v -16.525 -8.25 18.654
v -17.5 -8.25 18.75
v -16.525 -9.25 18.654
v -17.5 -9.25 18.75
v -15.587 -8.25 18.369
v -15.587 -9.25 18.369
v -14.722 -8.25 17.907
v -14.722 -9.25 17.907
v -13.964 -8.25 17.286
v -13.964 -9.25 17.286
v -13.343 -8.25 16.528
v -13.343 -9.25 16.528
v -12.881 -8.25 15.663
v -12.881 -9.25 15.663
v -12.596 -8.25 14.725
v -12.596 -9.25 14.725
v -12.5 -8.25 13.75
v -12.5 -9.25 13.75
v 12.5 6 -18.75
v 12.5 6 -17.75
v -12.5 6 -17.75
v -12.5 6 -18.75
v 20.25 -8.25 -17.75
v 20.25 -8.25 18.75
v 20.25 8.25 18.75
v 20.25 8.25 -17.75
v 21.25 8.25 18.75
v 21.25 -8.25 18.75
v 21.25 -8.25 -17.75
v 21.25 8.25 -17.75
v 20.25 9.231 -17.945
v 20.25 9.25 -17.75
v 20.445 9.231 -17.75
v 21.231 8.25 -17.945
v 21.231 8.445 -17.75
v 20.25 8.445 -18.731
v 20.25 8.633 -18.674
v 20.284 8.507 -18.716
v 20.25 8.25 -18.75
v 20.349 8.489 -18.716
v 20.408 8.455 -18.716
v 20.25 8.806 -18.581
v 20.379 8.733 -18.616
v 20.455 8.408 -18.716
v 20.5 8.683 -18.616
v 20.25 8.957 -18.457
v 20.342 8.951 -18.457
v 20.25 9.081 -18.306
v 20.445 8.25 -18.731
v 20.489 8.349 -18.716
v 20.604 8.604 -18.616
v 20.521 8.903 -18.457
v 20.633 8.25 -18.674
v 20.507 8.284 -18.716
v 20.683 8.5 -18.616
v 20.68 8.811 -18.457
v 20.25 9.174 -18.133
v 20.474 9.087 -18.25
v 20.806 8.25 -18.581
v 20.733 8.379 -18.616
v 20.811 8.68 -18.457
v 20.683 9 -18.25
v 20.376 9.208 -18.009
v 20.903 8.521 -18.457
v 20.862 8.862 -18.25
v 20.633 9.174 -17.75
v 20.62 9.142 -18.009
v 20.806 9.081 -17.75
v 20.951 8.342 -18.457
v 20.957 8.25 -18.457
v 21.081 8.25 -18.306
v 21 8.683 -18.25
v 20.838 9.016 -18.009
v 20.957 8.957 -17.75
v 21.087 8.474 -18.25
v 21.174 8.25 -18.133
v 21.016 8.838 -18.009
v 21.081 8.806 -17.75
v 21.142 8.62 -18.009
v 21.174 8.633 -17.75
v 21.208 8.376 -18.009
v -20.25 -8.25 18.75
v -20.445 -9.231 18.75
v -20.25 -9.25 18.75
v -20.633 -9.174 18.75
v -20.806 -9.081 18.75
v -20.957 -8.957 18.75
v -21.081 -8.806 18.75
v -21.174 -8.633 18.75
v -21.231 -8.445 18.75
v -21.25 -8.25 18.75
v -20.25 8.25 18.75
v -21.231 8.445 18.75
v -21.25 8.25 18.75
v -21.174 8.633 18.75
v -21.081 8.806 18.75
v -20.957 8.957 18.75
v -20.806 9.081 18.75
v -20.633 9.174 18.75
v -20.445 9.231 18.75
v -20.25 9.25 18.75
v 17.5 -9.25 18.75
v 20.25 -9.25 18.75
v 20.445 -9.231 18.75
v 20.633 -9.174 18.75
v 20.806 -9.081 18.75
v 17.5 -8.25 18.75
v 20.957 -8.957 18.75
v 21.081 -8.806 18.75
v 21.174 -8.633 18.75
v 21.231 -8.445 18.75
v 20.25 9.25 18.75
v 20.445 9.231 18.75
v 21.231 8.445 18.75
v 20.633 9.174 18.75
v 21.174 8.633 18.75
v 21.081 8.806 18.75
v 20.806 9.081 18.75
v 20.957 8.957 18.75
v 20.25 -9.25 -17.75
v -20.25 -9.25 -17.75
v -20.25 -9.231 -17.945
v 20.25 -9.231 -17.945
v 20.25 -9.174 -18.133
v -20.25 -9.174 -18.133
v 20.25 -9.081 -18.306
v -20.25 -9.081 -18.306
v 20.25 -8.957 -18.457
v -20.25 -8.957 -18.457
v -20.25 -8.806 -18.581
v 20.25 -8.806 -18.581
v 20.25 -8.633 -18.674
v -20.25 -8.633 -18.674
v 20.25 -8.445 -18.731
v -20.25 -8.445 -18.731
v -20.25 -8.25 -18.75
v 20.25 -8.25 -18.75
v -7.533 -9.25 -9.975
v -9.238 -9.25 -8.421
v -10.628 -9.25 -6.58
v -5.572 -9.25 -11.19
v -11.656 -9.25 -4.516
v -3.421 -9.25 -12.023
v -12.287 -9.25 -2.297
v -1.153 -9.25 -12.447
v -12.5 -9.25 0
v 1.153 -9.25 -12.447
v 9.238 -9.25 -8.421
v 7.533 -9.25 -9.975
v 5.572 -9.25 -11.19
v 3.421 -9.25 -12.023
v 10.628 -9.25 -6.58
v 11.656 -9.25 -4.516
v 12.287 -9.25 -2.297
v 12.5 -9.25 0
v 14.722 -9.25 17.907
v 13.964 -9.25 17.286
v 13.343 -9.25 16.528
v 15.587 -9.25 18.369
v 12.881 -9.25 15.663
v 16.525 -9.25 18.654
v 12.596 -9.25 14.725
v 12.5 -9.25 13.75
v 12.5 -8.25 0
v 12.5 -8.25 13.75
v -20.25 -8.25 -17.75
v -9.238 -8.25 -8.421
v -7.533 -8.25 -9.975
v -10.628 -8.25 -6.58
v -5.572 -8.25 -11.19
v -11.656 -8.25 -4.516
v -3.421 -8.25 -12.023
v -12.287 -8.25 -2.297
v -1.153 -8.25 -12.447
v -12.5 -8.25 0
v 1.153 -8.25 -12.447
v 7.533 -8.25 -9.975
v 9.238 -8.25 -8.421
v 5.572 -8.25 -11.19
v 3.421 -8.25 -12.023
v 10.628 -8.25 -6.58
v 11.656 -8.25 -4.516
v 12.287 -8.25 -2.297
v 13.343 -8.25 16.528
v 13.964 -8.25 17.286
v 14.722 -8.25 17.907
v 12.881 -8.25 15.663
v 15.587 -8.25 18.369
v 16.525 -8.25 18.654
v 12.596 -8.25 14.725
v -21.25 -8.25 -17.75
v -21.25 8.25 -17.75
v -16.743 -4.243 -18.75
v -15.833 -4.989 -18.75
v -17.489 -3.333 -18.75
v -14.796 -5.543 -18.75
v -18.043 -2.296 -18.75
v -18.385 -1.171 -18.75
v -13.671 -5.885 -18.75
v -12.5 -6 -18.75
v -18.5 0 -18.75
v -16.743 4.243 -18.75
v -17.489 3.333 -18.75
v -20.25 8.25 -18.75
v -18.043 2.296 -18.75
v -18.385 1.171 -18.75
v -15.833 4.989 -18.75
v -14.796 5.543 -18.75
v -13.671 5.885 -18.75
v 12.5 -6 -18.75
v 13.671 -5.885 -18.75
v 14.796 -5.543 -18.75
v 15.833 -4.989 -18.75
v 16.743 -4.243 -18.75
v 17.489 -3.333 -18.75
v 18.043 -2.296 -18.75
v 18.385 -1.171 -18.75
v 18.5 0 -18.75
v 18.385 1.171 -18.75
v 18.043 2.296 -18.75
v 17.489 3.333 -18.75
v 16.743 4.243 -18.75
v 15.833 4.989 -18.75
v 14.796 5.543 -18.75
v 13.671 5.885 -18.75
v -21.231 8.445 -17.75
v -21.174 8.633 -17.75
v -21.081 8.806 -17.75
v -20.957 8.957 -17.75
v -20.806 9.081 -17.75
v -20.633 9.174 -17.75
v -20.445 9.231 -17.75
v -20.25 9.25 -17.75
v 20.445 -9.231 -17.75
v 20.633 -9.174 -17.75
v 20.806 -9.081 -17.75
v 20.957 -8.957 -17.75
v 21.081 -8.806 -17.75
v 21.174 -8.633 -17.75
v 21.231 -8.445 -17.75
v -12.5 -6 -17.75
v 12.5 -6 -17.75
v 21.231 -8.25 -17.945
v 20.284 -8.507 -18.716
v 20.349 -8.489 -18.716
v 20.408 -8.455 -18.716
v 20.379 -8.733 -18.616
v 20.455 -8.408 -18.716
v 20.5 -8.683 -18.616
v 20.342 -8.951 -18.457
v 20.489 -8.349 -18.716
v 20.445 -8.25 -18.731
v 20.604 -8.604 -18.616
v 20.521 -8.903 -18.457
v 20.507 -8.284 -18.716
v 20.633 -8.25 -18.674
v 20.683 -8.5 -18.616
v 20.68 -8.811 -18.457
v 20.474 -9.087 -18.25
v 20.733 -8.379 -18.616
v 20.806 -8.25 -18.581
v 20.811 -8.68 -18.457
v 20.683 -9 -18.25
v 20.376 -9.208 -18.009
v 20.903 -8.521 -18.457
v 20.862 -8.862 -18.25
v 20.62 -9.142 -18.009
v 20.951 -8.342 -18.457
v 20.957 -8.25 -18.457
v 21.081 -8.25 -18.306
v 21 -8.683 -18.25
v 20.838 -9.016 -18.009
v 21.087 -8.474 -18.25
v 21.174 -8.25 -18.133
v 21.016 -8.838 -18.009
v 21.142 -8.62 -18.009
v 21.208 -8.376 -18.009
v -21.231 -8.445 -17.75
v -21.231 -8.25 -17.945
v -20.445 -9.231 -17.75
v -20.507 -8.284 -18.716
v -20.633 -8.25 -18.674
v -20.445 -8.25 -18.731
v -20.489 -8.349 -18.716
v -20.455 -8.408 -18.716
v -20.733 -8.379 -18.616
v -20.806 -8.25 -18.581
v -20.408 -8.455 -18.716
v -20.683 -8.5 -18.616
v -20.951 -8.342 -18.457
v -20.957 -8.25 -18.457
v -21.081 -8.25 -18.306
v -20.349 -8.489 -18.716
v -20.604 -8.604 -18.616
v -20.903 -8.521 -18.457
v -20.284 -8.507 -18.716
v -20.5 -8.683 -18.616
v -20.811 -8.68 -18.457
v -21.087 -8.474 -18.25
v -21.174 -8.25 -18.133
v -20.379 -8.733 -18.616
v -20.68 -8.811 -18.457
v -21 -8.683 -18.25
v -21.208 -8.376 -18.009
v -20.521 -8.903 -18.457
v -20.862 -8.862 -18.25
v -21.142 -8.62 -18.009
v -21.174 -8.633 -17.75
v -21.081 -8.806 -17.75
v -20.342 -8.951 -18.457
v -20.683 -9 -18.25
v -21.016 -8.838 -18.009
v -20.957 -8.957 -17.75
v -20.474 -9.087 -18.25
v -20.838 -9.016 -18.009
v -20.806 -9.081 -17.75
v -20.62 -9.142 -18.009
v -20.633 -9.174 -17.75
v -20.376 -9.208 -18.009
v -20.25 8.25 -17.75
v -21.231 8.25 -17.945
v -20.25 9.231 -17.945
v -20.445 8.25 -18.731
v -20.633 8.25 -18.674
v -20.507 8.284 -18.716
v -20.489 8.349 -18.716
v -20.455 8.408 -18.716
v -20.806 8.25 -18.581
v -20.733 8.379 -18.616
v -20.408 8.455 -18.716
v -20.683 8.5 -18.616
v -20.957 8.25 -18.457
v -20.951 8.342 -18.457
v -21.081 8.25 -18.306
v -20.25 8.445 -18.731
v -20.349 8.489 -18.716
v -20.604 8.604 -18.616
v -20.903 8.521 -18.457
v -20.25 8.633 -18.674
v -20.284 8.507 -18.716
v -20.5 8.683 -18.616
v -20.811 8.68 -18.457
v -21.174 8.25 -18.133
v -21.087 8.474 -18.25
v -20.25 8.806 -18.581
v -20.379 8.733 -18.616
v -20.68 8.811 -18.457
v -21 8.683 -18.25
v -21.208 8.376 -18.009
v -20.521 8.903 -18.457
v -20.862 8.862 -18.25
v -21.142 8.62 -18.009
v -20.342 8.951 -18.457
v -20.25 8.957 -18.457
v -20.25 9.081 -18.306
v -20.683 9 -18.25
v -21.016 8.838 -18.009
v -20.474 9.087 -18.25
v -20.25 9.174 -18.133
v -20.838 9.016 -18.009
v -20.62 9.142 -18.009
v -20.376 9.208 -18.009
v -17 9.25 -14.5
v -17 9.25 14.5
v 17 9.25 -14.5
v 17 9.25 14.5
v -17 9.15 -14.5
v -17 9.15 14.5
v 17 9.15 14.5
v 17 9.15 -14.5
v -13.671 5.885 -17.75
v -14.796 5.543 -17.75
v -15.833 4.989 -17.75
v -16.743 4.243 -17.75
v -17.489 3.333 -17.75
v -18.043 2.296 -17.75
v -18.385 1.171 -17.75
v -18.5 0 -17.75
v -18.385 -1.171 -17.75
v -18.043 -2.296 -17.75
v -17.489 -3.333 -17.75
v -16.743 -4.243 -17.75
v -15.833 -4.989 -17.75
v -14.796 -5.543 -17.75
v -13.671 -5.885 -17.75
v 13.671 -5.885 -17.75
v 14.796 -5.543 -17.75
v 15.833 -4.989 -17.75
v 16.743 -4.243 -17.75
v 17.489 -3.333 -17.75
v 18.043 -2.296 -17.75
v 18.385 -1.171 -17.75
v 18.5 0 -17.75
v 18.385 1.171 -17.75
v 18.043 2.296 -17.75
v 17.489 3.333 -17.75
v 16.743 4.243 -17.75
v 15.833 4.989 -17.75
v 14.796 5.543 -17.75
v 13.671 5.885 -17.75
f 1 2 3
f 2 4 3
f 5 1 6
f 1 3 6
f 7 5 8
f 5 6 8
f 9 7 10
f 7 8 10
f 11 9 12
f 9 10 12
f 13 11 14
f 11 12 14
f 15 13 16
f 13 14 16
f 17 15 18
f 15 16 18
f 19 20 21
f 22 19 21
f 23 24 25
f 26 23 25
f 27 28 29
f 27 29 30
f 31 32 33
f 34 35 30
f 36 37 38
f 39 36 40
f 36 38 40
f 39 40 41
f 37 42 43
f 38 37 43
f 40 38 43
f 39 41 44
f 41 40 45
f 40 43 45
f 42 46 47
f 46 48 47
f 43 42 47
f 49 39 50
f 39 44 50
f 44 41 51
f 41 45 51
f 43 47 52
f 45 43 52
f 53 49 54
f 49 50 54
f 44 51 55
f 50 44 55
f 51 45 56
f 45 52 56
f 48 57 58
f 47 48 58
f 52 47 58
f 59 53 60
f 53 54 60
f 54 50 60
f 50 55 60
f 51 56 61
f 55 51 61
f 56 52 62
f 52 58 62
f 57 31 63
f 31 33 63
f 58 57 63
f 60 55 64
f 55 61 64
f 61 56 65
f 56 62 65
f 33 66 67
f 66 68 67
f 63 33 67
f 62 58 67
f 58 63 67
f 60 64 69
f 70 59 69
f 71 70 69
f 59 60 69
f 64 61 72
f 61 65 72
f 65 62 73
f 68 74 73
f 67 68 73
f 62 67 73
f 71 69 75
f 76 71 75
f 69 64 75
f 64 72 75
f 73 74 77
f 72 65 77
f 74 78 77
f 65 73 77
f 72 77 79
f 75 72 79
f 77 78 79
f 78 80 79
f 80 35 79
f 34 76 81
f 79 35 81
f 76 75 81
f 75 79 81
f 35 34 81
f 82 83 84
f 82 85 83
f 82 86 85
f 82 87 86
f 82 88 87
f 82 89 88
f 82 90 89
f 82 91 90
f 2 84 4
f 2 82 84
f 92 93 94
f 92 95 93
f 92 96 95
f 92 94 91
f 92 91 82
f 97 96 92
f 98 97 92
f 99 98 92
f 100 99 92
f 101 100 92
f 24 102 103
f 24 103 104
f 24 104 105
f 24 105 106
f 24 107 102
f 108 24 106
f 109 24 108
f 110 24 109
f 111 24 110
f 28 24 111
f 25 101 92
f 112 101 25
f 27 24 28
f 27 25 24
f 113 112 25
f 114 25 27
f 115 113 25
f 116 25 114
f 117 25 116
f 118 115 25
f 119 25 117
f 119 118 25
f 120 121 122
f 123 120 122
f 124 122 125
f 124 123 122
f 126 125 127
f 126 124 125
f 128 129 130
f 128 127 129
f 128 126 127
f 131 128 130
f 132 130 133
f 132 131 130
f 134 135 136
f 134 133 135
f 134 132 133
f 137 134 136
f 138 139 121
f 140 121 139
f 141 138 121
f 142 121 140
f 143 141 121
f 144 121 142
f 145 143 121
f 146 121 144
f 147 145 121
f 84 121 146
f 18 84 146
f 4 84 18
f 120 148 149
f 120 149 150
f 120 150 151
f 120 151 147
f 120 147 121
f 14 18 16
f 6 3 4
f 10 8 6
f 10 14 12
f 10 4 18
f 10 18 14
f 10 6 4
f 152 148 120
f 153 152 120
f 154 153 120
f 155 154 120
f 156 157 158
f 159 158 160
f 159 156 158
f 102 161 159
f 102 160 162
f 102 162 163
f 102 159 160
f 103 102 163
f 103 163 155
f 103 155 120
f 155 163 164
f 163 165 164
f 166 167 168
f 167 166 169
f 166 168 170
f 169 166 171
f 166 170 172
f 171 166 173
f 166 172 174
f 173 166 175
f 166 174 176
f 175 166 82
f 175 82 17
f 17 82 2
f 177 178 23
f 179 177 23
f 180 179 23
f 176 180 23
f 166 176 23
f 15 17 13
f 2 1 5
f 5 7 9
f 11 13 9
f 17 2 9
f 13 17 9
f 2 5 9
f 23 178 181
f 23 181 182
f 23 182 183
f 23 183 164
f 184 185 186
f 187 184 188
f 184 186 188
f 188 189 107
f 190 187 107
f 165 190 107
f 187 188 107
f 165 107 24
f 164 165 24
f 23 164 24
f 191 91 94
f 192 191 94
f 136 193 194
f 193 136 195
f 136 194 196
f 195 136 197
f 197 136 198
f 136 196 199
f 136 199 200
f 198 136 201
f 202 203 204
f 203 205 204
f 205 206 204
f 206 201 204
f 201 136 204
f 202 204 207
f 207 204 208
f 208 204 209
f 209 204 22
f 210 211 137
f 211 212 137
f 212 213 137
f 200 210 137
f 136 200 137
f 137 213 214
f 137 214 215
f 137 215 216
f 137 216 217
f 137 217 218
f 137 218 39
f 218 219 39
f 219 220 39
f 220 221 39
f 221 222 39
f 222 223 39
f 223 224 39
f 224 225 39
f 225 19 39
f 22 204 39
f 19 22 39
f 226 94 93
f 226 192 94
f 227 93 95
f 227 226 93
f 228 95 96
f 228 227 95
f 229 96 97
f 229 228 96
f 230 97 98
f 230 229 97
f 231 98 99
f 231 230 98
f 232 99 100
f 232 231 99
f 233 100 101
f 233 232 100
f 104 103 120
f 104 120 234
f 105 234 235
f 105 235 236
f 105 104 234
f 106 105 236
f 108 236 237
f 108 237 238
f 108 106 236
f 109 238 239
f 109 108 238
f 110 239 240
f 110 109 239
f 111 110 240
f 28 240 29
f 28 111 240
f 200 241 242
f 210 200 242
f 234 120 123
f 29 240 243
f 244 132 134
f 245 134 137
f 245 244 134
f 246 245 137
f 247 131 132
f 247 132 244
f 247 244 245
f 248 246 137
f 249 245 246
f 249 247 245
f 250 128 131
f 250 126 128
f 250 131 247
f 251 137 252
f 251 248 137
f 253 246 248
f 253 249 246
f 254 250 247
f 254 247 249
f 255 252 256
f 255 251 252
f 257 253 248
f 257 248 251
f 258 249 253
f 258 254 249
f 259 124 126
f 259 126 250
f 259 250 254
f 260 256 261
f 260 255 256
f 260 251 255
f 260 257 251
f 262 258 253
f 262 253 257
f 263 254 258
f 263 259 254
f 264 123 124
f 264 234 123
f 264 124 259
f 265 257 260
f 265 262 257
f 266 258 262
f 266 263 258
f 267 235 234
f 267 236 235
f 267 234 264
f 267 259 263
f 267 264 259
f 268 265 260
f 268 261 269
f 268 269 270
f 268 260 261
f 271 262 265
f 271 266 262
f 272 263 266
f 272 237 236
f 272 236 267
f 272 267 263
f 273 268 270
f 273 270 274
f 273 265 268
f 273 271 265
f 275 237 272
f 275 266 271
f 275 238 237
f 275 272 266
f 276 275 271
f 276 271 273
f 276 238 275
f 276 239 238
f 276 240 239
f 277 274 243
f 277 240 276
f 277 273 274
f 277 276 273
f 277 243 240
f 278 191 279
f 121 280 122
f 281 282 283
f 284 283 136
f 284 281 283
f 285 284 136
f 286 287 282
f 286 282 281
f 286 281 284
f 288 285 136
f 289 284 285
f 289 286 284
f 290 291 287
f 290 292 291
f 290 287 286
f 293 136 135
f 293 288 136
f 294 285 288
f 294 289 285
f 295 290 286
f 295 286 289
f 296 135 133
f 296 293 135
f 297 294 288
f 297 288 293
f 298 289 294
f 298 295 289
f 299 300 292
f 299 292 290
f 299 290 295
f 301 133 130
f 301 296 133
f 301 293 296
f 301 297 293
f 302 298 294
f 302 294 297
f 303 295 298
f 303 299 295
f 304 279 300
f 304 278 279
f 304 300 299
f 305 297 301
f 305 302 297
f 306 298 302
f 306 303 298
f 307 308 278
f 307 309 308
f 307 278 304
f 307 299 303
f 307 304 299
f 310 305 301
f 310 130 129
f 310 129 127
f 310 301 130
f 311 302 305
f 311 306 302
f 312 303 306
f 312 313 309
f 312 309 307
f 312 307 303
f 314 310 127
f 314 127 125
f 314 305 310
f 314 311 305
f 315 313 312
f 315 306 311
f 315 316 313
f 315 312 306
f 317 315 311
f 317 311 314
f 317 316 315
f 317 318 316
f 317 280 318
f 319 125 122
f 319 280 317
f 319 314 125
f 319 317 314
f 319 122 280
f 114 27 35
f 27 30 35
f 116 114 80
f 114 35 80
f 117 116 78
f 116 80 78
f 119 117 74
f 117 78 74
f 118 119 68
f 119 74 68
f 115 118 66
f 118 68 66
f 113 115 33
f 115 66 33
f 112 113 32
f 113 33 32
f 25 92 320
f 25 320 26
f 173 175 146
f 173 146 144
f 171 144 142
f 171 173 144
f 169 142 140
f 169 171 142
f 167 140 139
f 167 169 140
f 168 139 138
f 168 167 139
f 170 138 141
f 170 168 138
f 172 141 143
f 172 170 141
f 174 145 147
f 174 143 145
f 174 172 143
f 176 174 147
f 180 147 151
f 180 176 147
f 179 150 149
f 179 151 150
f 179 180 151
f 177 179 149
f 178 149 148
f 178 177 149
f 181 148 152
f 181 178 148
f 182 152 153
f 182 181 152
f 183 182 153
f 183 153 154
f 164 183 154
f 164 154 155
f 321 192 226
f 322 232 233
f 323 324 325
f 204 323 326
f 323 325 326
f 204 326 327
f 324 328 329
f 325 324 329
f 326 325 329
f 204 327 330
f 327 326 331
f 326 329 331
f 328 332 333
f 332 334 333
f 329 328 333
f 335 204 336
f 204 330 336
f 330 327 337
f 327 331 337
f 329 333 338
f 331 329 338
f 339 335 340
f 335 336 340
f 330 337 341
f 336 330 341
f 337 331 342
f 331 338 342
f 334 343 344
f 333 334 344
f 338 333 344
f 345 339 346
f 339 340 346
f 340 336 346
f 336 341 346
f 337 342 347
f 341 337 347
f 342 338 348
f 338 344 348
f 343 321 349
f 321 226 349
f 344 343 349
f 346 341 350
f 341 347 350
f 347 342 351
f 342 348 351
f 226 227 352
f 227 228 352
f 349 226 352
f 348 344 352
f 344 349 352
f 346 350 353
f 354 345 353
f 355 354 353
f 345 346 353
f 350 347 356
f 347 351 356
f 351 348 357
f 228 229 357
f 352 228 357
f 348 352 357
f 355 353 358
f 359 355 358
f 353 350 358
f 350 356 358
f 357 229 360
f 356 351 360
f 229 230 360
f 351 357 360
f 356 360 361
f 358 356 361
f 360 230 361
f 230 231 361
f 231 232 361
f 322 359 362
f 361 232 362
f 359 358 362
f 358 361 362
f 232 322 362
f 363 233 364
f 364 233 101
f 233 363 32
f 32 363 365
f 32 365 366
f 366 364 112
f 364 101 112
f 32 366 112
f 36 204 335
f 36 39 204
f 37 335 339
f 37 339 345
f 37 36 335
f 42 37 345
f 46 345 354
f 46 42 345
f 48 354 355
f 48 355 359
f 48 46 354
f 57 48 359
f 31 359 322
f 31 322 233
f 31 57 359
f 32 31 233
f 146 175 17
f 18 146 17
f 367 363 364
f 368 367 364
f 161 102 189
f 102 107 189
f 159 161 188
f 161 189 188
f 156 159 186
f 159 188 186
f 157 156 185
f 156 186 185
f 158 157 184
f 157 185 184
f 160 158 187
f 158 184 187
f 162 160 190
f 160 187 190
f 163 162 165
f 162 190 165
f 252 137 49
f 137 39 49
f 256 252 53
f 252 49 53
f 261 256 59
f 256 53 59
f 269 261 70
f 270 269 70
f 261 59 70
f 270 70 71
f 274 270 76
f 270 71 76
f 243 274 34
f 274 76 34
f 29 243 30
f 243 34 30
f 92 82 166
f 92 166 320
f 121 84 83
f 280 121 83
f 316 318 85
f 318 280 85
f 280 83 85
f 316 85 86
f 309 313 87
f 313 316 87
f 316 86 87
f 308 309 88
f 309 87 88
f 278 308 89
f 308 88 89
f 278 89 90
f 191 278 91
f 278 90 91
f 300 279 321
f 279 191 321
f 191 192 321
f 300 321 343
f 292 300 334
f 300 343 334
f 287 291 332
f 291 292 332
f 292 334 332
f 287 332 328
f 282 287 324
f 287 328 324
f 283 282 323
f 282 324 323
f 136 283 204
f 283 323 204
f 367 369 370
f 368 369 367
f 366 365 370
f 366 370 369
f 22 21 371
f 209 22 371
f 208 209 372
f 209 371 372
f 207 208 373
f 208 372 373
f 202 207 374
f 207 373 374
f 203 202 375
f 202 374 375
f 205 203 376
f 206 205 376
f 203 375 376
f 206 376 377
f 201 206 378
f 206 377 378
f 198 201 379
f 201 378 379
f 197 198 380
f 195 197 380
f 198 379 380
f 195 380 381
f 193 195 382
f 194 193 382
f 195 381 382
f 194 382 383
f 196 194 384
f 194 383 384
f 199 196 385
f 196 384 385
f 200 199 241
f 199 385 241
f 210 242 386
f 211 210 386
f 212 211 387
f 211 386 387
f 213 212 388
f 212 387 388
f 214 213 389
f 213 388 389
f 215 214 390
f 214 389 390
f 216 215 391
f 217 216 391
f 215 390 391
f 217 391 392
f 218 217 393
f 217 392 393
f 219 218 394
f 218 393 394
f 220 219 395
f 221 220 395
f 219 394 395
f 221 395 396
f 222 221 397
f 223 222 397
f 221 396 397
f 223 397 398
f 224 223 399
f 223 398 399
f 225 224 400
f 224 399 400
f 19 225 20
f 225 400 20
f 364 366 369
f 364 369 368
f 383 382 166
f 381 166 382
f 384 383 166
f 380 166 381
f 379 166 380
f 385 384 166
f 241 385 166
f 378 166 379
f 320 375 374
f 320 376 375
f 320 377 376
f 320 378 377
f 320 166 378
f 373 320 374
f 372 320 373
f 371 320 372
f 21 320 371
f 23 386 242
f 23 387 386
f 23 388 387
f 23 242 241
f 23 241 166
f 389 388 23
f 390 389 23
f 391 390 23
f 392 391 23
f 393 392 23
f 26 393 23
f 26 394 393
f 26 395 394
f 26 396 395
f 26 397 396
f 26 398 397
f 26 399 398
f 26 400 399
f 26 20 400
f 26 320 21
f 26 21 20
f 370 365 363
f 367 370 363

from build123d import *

# Parameters (mm, degrees)
SKETCH_W        = 42.5
SKETCH_H        = 18.5
PAD_DEPTH       = 18.75
SKETCH001_W     = 40.5
SKETCH001_H     = 16.5
POCKET_DEPTH    = 18.75
POCKET001_DEPTH = 9.251
SKETCH003_W     = 34
SKETCH003_H     = 29
POCKET002_DEPTH = 0.1
POCKET003_DEPTH = 18.751
FILLET_R        = 5
FILLET001_R     = 1


with BuildPart() as part:
    # Sketch → Pad (new body, symmetric)
    with BuildSketch(Plane.XY):
        Rectangle(SKETCH_W, SKETCH_H)
    extrude(amount=PAD_DEPTH, both=True)

    # Sketch001 → Pocket (cut, symmetric)
    with BuildSketch(Plane.XY.offset(1)):
        Rectangle(SKETCH001_W, SKETCH001_H)
    extrude(amount=POCKET_DEPTH, both=True, mode=Mode.SUBTRACT)

    # Sketch002 → Pocket001 (cut, through all)
    with BuildSketch(Plane.XZ):
        with BuildLine():
            ThreePointArc((-12.5, 0), (0, -12.5), (12.5, 0))
            Line((12.5, 21.558593), (12.5, 0))
            Line((-12.5, 21.558593), (12.5, 21.558593))
            Line((-12.5, 0), (-12.5, 21.558593))
        make_face()
    extrude(amount=POCKET001_DEPTH, mode=Mode.SUBTRACT)

    # Sketch003 → Pocket002 (cut)
    with BuildSketch(Plane(origin=(0, 9.25, 0), x_dir=(-1, 0, 0), z_dir=(0, 1, 0))):
        Rectangle(SKETCH003_W, SKETCH003_H)
    extrude(amount=-POCKET002_DEPTH, mode=Mode.SUBTRACT)

    # Sketch004 → Pocket003 (cut, through all)
    with BuildSketch(Plane.XY):
        with BuildLine():
            ThreePointArc((-12.5, 6), (-18.5, 0), (-12.5, -6))
            Line((-12.5, -6), (12.5, -6))
            ThreePointArc((12.5, -6), (18.5, 0), (12.5, 6))
            Line((12.5, 6), (-12.5, 6))
        make_face()
    extrude(amount=-POCKET003_DEPTH, mode=Mode.SUBTRACT)

    # Fillet
    fillet_edges = [part.edges().sort_by_distance(p)[0] for p in [
        (-12.5, -8.75, 18.75),
        (12.5, -8.75, 18.75),
    ]]
    fillet(fillet_edges, radius=FILLET_R)

    # Fillet001
    fillet001_edges = [part.edges().sort_by_distance(p)[0] for p in [
        (-21.25, 9.25, 0),
        (-21.25, -9.25, 0),
        (21.25, -9.25, 0),
        (21.25, 9.25, 0),
        (-21.25, 0, -18.75),
        (0, -9.25, -18.75),
        (0, 9.25, -18.75),
        (21.25, 0, -18.75),
    ]]
    fillet(fillet001_edges, radius=FILLET001_R)


solid = part.part
